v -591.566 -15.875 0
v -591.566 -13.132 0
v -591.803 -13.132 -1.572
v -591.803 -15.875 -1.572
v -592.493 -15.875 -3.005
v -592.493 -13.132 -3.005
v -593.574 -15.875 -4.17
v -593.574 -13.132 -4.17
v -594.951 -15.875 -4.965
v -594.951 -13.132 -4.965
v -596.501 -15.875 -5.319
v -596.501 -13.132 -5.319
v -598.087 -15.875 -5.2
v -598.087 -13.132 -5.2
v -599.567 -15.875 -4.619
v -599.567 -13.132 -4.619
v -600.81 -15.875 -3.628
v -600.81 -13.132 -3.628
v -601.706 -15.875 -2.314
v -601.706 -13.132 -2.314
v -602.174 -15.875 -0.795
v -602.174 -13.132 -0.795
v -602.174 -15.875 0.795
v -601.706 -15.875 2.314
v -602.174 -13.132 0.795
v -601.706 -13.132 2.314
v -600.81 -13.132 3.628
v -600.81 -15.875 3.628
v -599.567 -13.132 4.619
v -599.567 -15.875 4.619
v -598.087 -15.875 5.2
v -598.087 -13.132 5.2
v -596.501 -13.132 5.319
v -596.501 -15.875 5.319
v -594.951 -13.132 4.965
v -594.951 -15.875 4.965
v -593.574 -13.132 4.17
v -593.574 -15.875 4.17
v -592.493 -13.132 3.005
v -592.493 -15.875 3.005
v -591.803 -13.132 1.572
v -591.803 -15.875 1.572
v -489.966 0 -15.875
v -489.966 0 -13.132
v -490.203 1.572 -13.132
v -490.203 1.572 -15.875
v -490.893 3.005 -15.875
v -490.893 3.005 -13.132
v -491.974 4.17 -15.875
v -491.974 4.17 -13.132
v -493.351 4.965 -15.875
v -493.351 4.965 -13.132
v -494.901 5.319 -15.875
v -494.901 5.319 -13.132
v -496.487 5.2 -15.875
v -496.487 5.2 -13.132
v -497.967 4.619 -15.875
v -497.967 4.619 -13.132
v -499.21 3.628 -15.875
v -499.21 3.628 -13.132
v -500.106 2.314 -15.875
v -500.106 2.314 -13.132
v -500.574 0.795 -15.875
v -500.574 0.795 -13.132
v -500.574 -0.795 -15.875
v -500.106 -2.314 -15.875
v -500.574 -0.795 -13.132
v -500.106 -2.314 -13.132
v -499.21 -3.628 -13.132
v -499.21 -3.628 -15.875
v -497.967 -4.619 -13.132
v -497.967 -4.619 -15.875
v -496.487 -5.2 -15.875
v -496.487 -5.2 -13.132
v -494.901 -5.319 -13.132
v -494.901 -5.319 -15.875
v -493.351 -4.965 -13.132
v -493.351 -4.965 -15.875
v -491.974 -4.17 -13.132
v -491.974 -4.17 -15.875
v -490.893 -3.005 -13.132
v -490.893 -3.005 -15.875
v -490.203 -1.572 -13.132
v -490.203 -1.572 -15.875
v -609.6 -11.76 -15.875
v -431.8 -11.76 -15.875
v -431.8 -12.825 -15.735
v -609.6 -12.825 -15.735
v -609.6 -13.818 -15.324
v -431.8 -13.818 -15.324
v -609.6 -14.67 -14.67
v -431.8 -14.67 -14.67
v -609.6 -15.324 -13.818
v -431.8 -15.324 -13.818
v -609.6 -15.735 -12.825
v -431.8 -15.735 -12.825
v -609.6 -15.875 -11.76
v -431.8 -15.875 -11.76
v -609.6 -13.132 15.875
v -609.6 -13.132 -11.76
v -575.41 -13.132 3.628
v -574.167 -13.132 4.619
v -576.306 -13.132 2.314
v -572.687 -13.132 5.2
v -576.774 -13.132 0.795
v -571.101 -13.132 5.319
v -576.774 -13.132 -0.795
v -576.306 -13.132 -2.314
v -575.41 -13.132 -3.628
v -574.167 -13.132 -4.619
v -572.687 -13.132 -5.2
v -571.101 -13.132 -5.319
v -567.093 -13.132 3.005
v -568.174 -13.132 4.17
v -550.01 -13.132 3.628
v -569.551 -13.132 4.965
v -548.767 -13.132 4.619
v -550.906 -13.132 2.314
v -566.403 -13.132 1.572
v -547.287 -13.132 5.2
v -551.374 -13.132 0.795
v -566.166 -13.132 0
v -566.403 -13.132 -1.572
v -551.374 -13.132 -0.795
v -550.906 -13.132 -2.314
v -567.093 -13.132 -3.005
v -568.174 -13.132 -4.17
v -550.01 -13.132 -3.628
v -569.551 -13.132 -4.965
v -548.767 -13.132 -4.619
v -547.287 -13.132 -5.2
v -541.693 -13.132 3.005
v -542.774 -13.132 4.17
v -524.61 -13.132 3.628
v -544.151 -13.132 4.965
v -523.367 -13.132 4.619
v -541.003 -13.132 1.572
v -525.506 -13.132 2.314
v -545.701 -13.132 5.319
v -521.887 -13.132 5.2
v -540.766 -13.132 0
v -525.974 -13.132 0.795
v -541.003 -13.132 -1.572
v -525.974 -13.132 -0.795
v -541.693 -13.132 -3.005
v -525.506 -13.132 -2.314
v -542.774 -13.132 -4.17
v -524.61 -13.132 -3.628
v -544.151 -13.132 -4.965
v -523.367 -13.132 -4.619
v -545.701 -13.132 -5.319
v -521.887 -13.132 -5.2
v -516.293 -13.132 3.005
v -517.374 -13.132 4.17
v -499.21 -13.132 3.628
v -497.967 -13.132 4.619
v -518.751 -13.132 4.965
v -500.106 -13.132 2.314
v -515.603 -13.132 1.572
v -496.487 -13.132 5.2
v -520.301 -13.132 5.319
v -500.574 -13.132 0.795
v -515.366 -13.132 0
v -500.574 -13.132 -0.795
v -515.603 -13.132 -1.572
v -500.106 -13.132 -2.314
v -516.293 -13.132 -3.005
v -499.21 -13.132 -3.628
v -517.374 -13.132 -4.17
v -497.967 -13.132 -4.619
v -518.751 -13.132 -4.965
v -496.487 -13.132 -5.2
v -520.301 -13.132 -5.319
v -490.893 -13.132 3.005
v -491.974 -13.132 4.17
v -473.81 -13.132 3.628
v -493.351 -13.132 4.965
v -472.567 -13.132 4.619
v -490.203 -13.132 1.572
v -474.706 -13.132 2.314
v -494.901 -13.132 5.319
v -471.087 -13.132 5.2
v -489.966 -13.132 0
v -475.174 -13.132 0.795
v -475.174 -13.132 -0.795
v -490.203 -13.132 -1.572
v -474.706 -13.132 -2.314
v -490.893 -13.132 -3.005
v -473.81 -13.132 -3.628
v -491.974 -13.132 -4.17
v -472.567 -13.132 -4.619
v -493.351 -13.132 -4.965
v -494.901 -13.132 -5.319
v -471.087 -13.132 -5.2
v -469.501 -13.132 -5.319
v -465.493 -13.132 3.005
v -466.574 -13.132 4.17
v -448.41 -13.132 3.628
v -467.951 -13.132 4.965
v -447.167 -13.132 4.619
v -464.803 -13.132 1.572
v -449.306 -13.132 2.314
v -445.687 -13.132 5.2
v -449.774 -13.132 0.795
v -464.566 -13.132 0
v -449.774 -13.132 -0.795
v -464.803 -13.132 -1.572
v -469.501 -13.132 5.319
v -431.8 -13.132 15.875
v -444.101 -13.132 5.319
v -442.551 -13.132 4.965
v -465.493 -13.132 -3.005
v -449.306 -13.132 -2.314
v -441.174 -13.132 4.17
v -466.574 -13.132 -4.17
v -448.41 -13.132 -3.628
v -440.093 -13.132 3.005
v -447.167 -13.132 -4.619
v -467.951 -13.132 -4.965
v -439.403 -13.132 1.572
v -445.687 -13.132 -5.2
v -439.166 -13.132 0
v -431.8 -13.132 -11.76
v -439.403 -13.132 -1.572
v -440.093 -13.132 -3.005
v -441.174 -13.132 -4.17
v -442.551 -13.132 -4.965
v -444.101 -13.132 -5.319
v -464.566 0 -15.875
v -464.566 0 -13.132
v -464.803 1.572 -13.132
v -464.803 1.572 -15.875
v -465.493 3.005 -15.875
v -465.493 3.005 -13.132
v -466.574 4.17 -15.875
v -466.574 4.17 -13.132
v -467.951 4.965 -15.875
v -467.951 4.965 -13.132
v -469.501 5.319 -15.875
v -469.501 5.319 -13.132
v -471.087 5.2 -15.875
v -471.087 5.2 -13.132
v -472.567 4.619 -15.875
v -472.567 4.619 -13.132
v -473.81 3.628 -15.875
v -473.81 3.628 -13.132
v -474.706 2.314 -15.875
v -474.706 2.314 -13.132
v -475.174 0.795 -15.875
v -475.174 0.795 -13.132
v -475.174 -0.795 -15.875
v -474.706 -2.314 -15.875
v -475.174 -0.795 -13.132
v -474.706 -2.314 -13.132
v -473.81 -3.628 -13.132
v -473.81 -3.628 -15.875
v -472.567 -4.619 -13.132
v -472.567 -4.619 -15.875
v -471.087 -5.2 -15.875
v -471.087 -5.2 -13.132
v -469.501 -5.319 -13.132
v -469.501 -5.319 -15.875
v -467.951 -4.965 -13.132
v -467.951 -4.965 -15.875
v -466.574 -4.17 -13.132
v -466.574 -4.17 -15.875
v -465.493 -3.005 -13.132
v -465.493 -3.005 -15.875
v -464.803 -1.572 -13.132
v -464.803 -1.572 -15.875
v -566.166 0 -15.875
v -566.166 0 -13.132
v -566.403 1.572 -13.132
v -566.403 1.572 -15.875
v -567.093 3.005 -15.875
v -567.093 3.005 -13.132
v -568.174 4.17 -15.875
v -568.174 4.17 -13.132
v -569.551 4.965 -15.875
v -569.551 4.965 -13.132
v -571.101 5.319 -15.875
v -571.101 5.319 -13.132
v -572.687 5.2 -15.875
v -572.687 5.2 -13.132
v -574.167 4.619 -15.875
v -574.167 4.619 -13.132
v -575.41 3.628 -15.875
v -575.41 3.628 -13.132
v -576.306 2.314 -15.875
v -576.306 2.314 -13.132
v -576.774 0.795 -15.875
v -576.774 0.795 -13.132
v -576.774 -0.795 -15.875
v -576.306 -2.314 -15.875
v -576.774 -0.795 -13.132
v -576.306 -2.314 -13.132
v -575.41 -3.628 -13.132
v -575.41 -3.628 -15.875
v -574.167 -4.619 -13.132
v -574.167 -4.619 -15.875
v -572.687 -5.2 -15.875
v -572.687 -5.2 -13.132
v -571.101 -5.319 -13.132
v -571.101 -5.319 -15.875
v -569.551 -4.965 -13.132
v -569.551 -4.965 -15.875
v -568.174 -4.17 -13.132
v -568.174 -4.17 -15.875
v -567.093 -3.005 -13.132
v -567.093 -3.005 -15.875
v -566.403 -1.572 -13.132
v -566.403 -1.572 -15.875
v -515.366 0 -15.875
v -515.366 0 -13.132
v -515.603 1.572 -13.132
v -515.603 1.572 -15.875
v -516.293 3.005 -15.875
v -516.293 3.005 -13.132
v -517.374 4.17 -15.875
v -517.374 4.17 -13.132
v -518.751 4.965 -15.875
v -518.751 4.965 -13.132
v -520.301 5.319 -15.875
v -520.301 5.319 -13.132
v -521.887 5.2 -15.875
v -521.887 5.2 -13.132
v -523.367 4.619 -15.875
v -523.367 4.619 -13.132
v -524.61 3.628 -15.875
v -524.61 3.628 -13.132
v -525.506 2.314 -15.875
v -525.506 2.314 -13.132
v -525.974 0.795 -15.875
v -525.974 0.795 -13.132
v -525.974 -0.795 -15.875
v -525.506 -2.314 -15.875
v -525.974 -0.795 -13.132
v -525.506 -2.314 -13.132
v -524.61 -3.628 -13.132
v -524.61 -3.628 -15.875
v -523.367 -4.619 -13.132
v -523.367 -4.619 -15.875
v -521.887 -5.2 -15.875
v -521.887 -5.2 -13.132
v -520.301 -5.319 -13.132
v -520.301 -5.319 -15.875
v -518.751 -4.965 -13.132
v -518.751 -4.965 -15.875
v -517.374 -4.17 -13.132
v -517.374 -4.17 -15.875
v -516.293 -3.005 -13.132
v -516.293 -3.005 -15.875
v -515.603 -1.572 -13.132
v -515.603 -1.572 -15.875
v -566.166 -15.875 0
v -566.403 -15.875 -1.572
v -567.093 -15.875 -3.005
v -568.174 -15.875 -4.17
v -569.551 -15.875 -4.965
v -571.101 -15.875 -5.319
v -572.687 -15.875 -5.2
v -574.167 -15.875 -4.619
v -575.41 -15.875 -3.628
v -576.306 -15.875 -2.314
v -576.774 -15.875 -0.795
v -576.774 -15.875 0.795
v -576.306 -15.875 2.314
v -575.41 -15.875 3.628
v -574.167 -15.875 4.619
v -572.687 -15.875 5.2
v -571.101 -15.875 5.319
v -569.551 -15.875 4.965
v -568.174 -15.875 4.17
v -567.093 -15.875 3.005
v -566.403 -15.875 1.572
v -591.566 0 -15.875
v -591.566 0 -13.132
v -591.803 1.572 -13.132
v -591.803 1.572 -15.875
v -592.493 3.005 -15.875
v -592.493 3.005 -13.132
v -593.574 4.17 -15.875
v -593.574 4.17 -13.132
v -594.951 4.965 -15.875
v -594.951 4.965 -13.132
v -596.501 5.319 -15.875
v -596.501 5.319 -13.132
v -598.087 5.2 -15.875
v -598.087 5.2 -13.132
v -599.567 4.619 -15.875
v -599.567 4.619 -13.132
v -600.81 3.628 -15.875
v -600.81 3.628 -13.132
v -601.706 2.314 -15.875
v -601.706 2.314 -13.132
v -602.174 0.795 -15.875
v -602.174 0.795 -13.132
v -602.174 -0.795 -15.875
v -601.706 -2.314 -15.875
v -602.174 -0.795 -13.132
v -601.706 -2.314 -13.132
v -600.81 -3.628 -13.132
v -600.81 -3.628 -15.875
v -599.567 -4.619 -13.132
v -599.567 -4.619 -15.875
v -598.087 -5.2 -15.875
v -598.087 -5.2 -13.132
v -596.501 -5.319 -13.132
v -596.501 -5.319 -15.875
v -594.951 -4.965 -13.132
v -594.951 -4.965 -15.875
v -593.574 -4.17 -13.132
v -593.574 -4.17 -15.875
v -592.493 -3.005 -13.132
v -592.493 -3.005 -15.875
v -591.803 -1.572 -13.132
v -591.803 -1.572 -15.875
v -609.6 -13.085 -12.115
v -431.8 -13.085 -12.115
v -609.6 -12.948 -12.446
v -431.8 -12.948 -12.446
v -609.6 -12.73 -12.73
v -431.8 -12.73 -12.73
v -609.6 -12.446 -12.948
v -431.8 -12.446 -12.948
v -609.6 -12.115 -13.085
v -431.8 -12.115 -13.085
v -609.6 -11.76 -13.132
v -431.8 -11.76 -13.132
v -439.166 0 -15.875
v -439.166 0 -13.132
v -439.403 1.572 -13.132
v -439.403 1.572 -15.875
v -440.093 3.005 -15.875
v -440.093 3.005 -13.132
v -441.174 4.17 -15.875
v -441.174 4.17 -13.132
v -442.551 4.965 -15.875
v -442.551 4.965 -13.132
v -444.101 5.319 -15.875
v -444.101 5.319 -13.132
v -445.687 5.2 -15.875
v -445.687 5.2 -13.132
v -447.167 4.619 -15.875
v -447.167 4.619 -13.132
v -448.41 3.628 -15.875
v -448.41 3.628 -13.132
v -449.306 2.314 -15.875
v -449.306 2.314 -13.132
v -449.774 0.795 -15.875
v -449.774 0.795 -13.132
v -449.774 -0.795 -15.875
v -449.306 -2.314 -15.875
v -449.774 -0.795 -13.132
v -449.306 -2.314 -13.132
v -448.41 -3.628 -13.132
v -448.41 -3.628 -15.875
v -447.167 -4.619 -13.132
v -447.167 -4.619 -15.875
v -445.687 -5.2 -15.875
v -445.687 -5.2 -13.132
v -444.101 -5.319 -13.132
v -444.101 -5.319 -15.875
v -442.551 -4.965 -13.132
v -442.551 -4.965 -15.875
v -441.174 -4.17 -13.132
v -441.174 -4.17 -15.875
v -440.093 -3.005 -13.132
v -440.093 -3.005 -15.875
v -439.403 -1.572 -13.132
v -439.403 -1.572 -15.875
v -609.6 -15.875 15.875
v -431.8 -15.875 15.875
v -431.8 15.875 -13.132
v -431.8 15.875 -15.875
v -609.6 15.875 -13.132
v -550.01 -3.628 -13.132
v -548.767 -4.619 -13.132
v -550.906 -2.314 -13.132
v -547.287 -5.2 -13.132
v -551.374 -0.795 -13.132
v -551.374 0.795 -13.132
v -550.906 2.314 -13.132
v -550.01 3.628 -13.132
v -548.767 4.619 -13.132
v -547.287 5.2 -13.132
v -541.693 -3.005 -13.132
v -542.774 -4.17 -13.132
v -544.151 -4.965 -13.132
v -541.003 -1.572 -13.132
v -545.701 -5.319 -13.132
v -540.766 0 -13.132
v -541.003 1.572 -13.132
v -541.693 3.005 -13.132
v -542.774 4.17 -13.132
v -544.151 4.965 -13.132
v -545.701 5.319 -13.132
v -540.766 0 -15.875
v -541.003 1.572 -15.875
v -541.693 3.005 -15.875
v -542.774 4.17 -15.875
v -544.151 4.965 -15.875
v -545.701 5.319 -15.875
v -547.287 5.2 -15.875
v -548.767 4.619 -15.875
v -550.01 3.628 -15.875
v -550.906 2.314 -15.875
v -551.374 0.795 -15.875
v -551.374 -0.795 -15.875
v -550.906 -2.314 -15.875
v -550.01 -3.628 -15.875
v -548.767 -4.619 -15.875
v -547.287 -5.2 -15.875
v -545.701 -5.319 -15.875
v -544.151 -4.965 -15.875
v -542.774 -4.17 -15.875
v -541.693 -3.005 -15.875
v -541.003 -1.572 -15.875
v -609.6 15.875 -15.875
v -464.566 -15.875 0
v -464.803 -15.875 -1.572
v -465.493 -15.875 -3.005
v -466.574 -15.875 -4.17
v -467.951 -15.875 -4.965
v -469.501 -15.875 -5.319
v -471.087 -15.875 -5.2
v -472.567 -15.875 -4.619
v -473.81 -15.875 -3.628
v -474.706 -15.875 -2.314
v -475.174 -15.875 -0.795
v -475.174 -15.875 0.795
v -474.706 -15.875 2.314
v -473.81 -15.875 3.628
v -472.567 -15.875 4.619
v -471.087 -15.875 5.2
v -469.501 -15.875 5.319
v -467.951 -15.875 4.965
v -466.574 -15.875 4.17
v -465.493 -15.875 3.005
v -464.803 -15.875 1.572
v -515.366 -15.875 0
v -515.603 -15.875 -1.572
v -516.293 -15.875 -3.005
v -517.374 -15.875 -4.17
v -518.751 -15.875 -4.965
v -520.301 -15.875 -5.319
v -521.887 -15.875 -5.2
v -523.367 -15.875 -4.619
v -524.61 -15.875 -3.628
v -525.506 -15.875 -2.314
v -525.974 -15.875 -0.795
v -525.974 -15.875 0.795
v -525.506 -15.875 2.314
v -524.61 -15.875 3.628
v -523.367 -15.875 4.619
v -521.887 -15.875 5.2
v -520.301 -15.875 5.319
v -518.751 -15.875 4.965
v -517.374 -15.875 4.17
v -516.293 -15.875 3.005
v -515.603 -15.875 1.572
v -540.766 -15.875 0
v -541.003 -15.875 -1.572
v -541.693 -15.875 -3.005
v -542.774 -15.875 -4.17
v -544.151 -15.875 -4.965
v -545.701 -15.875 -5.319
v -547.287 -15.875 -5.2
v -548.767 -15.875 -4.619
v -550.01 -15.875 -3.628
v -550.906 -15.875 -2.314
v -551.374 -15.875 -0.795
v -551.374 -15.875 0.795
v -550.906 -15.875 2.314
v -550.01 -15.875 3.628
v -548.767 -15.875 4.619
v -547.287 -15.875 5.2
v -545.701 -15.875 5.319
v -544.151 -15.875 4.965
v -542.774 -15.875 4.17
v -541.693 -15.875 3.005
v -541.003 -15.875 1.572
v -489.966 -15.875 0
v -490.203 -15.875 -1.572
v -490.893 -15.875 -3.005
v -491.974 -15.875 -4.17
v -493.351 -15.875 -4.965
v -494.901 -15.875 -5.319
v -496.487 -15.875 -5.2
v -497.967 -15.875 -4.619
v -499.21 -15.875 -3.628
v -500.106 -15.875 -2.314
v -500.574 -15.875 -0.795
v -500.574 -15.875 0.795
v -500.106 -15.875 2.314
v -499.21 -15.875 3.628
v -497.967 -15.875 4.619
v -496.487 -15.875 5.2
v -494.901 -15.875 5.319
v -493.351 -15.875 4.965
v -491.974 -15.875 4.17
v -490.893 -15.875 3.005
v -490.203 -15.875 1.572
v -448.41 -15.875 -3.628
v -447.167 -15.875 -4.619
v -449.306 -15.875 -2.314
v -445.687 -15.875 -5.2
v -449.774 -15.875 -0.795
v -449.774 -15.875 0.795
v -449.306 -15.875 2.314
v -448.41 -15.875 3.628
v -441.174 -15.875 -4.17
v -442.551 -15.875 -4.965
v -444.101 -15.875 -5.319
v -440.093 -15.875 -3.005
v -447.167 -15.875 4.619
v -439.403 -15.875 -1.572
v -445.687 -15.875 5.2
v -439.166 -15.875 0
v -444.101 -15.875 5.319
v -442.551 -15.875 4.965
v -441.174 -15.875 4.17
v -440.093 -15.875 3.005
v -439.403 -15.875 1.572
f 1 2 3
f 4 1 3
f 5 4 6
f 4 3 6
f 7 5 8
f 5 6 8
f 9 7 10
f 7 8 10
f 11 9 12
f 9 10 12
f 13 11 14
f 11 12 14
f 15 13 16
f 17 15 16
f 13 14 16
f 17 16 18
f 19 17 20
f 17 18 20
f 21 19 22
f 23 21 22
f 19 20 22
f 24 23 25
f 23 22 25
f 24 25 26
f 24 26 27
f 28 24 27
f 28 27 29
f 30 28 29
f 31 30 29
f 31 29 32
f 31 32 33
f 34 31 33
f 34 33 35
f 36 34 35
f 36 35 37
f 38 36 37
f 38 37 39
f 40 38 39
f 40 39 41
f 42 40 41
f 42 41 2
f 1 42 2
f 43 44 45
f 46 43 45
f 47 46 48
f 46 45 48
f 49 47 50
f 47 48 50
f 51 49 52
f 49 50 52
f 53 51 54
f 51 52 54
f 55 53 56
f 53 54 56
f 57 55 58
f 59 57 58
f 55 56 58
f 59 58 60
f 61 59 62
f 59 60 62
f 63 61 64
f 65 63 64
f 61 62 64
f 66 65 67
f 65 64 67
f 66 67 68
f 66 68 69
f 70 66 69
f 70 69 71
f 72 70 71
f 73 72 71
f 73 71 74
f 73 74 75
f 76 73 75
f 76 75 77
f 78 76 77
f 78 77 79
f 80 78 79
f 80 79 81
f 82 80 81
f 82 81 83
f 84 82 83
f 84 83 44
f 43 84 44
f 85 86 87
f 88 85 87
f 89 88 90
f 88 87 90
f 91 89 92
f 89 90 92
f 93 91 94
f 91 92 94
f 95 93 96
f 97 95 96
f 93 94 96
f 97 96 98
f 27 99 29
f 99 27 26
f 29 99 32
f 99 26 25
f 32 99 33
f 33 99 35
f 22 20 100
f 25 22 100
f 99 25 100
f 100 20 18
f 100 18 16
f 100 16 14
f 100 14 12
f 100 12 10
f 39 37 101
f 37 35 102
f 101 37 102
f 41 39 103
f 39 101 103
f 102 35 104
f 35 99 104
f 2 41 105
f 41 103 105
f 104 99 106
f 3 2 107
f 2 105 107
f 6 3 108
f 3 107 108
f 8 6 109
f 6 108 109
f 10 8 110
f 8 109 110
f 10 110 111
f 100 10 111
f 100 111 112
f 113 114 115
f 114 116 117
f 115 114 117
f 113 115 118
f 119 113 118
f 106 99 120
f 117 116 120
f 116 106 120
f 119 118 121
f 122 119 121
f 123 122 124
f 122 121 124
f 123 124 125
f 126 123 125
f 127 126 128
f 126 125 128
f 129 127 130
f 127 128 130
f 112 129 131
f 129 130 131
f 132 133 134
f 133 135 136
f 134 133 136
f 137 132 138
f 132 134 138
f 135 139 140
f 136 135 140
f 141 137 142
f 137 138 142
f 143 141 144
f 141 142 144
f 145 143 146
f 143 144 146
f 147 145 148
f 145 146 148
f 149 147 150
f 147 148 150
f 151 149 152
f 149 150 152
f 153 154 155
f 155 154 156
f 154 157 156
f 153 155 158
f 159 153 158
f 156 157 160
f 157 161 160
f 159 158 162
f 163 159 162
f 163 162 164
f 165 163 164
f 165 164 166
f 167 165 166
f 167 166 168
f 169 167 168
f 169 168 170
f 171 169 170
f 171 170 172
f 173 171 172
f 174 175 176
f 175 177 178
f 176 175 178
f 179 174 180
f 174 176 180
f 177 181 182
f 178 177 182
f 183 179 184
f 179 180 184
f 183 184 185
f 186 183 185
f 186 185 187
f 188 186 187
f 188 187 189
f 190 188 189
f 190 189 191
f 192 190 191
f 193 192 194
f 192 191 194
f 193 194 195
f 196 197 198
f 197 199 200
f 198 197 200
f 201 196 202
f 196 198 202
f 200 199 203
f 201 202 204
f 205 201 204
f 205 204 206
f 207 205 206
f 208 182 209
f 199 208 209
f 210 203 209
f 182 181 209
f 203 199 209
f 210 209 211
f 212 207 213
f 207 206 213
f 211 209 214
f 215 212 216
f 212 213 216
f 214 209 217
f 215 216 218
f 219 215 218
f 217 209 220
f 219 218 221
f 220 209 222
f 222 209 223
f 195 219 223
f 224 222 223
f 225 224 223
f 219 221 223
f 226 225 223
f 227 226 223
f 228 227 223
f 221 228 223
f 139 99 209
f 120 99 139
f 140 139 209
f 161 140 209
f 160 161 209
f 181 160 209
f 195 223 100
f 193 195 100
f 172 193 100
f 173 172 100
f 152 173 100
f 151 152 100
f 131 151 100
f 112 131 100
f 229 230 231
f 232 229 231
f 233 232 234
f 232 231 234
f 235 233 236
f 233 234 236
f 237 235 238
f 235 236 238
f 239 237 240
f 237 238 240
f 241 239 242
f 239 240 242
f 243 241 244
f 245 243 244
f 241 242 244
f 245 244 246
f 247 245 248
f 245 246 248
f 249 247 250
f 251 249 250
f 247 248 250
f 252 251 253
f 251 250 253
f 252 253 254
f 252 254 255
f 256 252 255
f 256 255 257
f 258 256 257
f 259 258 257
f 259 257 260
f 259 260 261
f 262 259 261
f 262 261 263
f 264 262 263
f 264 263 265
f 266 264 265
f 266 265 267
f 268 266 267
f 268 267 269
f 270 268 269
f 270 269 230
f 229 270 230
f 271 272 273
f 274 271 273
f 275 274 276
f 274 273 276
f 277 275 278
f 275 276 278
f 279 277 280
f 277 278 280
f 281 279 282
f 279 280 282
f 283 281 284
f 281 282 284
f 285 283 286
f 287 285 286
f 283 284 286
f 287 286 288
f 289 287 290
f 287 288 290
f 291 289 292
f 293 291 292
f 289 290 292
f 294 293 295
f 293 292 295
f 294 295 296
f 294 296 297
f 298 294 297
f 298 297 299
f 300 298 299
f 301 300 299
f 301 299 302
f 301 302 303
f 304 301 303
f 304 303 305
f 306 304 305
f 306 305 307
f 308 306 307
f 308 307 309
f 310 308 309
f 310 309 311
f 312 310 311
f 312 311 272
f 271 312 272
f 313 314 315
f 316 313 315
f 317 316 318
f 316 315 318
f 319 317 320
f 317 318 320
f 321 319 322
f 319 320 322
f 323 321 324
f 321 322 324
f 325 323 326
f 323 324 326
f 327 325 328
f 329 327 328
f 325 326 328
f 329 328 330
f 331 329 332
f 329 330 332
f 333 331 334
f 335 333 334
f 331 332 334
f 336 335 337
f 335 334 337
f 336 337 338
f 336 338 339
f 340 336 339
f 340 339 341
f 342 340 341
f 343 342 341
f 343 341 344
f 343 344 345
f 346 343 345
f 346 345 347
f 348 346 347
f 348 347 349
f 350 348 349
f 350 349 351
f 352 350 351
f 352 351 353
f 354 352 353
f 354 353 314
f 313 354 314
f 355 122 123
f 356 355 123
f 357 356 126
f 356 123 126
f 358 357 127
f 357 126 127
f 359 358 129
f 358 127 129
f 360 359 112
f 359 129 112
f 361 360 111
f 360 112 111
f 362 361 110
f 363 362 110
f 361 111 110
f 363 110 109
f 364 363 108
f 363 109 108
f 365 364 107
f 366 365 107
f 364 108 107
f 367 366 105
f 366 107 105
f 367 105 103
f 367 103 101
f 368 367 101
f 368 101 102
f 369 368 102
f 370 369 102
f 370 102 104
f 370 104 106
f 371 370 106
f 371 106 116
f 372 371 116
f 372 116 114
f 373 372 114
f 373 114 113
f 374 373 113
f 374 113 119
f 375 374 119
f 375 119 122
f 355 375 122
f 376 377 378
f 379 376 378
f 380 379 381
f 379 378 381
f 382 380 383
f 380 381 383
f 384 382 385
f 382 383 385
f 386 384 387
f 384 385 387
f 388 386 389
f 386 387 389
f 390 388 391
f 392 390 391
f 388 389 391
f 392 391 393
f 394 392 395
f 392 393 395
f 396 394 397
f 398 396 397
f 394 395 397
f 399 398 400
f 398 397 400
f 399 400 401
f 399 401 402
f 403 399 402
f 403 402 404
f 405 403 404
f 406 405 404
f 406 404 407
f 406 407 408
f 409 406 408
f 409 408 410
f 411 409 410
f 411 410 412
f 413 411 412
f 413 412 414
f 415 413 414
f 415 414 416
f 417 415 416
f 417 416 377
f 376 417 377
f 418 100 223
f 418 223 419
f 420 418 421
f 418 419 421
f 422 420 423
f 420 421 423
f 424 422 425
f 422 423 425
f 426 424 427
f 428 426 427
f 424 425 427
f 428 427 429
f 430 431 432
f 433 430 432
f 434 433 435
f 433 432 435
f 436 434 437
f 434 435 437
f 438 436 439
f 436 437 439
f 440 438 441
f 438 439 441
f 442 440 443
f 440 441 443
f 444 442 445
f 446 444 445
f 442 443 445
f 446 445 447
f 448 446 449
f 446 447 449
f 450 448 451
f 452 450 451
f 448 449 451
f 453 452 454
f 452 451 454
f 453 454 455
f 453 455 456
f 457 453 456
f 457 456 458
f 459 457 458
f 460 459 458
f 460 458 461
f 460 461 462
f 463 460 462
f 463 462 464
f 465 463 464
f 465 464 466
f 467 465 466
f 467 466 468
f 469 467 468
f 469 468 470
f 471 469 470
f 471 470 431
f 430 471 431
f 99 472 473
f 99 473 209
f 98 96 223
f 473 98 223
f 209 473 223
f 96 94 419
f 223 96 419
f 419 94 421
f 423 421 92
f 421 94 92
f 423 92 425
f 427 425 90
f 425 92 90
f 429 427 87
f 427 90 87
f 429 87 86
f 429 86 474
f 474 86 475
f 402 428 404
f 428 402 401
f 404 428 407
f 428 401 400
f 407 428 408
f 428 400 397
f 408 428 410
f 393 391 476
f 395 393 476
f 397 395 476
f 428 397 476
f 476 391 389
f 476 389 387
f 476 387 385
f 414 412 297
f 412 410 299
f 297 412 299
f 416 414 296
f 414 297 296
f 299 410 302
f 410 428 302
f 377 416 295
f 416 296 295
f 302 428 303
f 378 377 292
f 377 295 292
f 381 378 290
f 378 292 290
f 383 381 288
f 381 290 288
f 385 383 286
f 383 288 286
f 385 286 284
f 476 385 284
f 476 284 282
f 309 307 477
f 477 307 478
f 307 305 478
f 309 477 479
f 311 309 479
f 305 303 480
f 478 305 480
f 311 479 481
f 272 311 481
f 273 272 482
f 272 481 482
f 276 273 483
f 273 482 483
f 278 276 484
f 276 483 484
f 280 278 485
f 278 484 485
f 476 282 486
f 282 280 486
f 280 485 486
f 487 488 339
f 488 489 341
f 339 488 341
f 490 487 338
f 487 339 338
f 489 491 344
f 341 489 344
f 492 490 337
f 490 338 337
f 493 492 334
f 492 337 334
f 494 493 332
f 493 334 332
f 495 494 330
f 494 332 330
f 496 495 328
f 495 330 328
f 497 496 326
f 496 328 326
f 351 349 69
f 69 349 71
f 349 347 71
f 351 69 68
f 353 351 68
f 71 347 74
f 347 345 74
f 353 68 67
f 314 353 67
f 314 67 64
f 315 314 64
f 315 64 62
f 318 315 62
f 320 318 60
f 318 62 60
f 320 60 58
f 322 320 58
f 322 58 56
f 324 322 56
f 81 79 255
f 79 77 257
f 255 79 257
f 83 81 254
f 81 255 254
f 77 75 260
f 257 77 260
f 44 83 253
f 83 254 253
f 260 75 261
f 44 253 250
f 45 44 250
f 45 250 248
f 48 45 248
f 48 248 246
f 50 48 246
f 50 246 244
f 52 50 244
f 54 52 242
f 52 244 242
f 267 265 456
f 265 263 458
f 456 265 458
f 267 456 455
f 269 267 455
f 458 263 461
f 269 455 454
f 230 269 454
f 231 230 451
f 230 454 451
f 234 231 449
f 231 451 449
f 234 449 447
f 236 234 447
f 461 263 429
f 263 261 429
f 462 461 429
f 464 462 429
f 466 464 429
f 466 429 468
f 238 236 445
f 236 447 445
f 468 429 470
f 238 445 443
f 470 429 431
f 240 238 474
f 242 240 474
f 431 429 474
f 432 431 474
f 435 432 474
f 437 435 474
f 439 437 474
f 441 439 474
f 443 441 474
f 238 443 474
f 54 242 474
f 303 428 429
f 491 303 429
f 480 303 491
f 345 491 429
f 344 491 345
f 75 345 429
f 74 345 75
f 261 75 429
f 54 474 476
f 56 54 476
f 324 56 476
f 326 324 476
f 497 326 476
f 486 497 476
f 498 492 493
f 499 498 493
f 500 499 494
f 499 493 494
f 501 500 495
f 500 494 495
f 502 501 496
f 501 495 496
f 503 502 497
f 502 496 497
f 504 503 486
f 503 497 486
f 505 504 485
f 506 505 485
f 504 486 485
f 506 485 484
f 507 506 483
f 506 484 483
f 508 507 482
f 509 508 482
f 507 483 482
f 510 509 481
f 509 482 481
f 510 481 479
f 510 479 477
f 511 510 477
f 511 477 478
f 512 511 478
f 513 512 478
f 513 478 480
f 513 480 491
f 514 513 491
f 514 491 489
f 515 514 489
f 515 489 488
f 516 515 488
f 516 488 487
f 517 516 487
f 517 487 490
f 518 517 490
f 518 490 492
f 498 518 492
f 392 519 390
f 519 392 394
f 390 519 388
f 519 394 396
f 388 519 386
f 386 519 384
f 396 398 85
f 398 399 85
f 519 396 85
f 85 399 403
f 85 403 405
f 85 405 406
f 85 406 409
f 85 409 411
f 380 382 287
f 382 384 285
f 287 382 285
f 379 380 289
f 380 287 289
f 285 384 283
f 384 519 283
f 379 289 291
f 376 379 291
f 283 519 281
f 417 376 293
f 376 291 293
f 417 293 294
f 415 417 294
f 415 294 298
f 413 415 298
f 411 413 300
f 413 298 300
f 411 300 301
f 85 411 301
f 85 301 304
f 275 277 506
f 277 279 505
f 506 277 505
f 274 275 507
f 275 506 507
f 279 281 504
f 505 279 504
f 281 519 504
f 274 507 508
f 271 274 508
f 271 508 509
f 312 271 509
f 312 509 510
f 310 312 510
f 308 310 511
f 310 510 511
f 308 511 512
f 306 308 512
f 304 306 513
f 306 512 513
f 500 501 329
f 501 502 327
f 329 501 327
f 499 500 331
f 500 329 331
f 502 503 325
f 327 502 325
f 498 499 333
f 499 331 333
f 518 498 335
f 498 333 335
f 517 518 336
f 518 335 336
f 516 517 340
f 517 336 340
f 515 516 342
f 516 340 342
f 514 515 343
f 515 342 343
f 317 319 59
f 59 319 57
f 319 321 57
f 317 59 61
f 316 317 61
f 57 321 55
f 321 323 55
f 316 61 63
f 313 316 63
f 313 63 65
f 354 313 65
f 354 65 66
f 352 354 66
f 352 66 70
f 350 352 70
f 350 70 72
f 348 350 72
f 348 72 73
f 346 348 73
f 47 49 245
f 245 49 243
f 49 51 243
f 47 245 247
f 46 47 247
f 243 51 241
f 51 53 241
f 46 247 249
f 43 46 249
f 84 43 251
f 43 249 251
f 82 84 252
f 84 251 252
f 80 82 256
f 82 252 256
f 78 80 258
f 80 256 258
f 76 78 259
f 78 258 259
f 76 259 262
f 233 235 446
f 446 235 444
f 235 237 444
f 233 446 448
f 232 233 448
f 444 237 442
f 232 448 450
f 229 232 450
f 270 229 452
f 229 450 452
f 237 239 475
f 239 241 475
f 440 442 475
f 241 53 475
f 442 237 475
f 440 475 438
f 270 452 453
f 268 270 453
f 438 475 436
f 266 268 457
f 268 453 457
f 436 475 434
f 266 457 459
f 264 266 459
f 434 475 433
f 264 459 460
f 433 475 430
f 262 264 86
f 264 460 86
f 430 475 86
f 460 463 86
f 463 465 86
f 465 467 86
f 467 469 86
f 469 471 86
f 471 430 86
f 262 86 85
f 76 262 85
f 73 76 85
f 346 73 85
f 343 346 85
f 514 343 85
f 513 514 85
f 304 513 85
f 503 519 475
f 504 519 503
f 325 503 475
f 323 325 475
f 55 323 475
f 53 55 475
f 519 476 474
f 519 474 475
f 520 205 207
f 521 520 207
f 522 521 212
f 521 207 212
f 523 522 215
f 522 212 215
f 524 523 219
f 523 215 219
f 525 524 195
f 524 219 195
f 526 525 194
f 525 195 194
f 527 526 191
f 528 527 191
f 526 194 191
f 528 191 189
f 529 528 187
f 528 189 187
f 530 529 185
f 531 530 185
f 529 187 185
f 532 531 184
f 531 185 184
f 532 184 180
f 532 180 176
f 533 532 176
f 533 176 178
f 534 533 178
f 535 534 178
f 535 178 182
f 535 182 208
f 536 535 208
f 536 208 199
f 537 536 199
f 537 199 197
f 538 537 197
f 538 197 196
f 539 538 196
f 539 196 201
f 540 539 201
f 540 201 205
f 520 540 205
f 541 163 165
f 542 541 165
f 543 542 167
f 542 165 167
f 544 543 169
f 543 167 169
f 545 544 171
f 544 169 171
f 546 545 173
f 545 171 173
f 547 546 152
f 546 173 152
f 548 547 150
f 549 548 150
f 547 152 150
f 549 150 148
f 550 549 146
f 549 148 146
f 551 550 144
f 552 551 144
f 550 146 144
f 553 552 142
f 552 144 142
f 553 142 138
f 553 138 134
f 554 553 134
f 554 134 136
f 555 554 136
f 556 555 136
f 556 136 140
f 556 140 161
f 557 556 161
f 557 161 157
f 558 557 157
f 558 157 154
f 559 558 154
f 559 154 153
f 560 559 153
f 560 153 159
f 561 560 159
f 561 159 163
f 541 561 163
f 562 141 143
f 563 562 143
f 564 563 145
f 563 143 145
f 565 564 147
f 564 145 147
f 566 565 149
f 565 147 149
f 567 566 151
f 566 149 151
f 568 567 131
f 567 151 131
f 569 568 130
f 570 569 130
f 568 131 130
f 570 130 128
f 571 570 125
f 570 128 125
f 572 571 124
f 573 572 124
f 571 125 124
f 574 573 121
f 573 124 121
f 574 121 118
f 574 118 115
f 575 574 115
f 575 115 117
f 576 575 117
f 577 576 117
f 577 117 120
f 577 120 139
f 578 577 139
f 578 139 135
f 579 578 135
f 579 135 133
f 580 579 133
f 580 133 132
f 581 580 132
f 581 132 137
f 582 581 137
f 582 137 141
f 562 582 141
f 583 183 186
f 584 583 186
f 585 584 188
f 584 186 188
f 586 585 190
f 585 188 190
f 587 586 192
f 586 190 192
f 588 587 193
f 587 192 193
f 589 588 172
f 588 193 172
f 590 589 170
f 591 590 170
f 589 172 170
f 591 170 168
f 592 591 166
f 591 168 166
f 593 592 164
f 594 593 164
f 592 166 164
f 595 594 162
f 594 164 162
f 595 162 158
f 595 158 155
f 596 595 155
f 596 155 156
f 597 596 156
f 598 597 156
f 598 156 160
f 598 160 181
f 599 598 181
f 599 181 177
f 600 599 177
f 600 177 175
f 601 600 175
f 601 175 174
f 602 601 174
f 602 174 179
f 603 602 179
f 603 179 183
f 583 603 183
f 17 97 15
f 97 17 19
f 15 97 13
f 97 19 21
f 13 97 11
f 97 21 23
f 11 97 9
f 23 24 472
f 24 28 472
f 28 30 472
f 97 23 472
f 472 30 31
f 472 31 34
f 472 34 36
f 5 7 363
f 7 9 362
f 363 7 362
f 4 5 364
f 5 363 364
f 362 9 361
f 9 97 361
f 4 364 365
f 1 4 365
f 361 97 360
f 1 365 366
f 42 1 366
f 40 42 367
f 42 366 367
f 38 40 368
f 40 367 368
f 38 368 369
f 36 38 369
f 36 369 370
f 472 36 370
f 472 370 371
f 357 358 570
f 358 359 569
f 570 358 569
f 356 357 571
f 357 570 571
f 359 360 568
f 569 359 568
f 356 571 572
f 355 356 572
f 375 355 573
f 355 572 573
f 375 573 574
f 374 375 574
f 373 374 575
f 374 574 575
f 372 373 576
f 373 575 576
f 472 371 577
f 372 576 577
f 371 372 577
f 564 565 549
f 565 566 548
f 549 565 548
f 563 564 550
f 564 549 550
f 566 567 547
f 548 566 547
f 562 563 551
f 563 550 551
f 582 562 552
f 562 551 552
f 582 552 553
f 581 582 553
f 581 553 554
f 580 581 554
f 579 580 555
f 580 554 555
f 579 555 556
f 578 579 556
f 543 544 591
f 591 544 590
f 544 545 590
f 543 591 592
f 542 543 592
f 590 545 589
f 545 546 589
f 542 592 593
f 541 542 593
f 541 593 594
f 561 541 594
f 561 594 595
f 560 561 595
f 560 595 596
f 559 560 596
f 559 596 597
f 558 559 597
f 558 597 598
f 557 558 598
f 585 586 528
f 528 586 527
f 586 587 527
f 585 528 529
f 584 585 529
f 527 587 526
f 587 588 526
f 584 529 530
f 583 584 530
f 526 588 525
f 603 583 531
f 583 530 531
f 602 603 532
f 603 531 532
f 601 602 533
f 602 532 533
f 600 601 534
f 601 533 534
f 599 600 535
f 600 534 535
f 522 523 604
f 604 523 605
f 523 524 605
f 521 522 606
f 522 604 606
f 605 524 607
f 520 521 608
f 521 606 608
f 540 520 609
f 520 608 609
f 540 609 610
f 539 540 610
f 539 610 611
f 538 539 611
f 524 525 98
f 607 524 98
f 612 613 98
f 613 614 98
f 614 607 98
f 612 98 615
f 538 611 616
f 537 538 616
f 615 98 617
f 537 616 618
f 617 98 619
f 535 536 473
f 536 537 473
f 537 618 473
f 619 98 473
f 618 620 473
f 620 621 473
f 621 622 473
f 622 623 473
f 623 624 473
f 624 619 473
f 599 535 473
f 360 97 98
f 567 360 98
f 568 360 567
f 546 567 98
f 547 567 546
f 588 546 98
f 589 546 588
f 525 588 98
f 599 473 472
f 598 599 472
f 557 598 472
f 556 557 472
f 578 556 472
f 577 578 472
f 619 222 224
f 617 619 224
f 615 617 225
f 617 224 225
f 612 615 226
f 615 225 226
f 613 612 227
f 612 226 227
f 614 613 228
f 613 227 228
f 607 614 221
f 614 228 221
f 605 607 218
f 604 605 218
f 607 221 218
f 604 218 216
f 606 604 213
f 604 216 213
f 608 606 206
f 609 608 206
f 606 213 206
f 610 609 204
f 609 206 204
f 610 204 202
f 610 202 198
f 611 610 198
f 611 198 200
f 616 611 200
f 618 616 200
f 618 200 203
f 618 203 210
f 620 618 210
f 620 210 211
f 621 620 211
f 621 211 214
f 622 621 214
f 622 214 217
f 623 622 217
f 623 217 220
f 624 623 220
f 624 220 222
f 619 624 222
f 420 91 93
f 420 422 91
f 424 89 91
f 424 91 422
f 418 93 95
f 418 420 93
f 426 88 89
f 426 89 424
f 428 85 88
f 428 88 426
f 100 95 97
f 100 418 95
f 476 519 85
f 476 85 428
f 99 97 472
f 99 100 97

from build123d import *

# Parameters (mm, degrees)
BOSS_EXTRUDE1_DEPTH      = 609.6
BOSS_EXTRUDE1_DEPTH_BACK = 609.6
SKETCH5_R                = 5.334
CUT_EXTRUDE1_DEPTH       = 16.875
SKETCH6_R                = 5.334
CUT_EXTRUDE2_DEPTH       = 16.875
LPATTERN1_COUNT          = 48
LPATTERN1_PITCH          = 25.4
SKETCH7_W                = 635
SKETCH7_H                = 31.75
CUT_EXTRUDE3_DEPTH       = 70
SKETCH8_R                = 5.334
SKETCH8_W                = 25.4
SKETCH8_H                = 4.1148
CUT_EXTRUDE4_DEPTH       = 70
SKETCH9_R                = 5.334
SKETCH9_W                = 381
SKETCH9_H                = 4.1148
CUT_EXTRUDE5_DEPTH       = 70


with BuildPart() as part:
    # Sketch4 → Boss-Extrude1 (new body, two sides)
    with BuildSketch(Plane(origin=(0, 0, 0), x_dir=(0, 0, -1), z_dir=(1, 0, 0))) as boss_extrude1_sk:
        with BuildLine():
            Line((-15.875, -13.1318), (11.7602, -13.1318))
            ThreePointArc((11.7602, -13.1318), (12.730067661, -12.730067661), (13.1318, -11.7602))
            Line((13.1318, -11.7602), (13.1318, 15.875))
            Line((13.1318, 15.875), (15.875, 15.875))
            Line((15.875, 15.875), (15.875, -11.7602))
            ThreePointArc((15.875, -11.7602), (14.669802983, -14.669802983), (11.7602, -15.875))
            Line((11.7602, -15.875), (-15.875, -15.875))
            Line((-15.875, -15.875), (-15.875, -13.1318))
        make_face()
    extrude(amount=BOSS_EXTRUDE1_DEPTH)
    extrude(boss_extrude1_sk.sketch, amount=-BOSS_EXTRUDE1_DEPTH_BACK)

    # Sketch5 → Cut-Extrude1 (cut, through all)
    with BuildSketch(Plane.XY):
        with Locations((596.9, 0)):
            Circle(SKETCH5_R)
    cut_extrude1 = extrude(amount=-CUT_EXTRUDE1_DEPTH, mode=Mode.SUBTRACT)

    # Sketch6 → Cut-Extrude2 (cut, through all)
    with BuildSketch(Plane(origin=(0, 0, 0), x_dir=(1, 0, 0), z_dir=(0, 1, 0))):
        with Locations((596.9, 0)):
            Circle(SKETCH6_R)
    cut_extrude2 = extrude(amount=-CUT_EXTRUDE2_DEPTH, mode=Mode.SUBTRACT)

    # LPattern1: Cut-Extrude1, Cut-Extrude2 ×48
    with Locations(*[(-i * LPATTERN1_PITCH, 0, 0) for i in range(1, LPATTERN1_COUNT)]):
        add(cut_extrude1, mode=Mode.SUBTRACT)
        add(cut_extrude2, mode=Mode.SUBTRACT)

    # Sketch7 → Cut-Extrude3 (cut)
    with BuildSketch(Plane(origin=(0, 0, -15.875), x_dir=(-1, 0, 0), z_dir=(0, 0, -1))):
        with Locations((-292.1, 0)):
            Rectangle(SKETCH7_W, SKETCH7_H)
    extrude(amount=-CUT_EXTRUDE3_DEPTH, mode=Mode.SUBTRACT)

    # Sketch8 → Cut-Extrude4 (cut)
    with BuildSketch(Plane(origin=(0, 0, -15.875), x_dir=(-1, 0, 0), z_dir=(0, 0, -1))):
        Polygon((50.8, 15.875), (25.4, 15.875), (25.4, -11.7602), (50.8, -11.7602), (50.8, 0), align=None)
        with Locations((38.1, 0)):
            Circle(SKETCH8_R, mode=Mode.SUBTRACT)
        with Locations((38.1, -13.8176)):
            Rectangle(SKETCH8_W, SKETCH8_H)
    extrude(amount=-CUT_EXTRUDE4_DEPTH, mode=Mode.SUBTRACT)

    # Sketch9 → Cut-Extrude5 (cut)
    with BuildSketch(Plane(origin=(0, 0, -15.875), x_dir=(-1, 0, 0), z_dir=(0, 0, -1))):
        Polygon((431.8, 15.875), (50.8, 15.875), (50.8, -11.7602), (431.8, -11.7602), (431.8, 0), align=None)
        with Locations((63.5, 0)):
            Circle(SKETCH9_R, mode=Mode.SUBTRACT)
        with Locations((88.9, 0)):
            Circle(SKETCH9_R, mode=Mode.SUBTRACT)
        with Locations((114.3, 0)):
            Circle(SKETCH9_R, mode=Mode.SUBTRACT)
        with Locations((139.7, 0)):
            Circle(SKETCH9_R, mode=Mode.SUBTRACT)
        with Locations((165.1, 0)):
            Circle(SKETCH9_R, mode=Mode.SUBTRACT)
        with Locations((190.5, 0)):
            Circle(SKETCH9_R, mode=Mode.SUBTRACT)
        with Locations((215.9, 0)):
            Circle(SKETCH9_R, mode=Mode.SUBTRACT)
        with Locations((241.3, 0)):
            Circle(SKETCH9_R, mode=Mode.SUBTRACT)
        with Locations((266.7, 0)):
            Circle(SKETCH9_R, mode=Mode.SUBTRACT)
        with Locations((292.1, 0)):
            Circle(SKETCH9_R, mode=Mode.SUBTRACT)
        with Locations((317.5, 0)):
            Circle(SKETCH9_R, mode=Mode.SUBTRACT)
        with Locations((342.9, 0)):
            Circle(SKETCH9_R, mode=Mode.SUBTRACT)
        with Locations((368.3, 0)):
            Circle(SKETCH9_R, mode=Mode.SUBTRACT)
        with Locations((393.7, 0)):
            Circle(SKETCH9_R, mode=Mode.SUBTRACT)
        with Locations((419.1, 0)):
            Circle(SKETCH9_R, mode=Mode.SUBTRACT)
        with Locations((241.3, -13.8176)):
            Rectangle(SKETCH9_W, SKETCH9_H)
    extrude(amount=-CUT_EXTRUDE5_DEPTH, mode=Mode.SUBTRACT)


solid = part.part
